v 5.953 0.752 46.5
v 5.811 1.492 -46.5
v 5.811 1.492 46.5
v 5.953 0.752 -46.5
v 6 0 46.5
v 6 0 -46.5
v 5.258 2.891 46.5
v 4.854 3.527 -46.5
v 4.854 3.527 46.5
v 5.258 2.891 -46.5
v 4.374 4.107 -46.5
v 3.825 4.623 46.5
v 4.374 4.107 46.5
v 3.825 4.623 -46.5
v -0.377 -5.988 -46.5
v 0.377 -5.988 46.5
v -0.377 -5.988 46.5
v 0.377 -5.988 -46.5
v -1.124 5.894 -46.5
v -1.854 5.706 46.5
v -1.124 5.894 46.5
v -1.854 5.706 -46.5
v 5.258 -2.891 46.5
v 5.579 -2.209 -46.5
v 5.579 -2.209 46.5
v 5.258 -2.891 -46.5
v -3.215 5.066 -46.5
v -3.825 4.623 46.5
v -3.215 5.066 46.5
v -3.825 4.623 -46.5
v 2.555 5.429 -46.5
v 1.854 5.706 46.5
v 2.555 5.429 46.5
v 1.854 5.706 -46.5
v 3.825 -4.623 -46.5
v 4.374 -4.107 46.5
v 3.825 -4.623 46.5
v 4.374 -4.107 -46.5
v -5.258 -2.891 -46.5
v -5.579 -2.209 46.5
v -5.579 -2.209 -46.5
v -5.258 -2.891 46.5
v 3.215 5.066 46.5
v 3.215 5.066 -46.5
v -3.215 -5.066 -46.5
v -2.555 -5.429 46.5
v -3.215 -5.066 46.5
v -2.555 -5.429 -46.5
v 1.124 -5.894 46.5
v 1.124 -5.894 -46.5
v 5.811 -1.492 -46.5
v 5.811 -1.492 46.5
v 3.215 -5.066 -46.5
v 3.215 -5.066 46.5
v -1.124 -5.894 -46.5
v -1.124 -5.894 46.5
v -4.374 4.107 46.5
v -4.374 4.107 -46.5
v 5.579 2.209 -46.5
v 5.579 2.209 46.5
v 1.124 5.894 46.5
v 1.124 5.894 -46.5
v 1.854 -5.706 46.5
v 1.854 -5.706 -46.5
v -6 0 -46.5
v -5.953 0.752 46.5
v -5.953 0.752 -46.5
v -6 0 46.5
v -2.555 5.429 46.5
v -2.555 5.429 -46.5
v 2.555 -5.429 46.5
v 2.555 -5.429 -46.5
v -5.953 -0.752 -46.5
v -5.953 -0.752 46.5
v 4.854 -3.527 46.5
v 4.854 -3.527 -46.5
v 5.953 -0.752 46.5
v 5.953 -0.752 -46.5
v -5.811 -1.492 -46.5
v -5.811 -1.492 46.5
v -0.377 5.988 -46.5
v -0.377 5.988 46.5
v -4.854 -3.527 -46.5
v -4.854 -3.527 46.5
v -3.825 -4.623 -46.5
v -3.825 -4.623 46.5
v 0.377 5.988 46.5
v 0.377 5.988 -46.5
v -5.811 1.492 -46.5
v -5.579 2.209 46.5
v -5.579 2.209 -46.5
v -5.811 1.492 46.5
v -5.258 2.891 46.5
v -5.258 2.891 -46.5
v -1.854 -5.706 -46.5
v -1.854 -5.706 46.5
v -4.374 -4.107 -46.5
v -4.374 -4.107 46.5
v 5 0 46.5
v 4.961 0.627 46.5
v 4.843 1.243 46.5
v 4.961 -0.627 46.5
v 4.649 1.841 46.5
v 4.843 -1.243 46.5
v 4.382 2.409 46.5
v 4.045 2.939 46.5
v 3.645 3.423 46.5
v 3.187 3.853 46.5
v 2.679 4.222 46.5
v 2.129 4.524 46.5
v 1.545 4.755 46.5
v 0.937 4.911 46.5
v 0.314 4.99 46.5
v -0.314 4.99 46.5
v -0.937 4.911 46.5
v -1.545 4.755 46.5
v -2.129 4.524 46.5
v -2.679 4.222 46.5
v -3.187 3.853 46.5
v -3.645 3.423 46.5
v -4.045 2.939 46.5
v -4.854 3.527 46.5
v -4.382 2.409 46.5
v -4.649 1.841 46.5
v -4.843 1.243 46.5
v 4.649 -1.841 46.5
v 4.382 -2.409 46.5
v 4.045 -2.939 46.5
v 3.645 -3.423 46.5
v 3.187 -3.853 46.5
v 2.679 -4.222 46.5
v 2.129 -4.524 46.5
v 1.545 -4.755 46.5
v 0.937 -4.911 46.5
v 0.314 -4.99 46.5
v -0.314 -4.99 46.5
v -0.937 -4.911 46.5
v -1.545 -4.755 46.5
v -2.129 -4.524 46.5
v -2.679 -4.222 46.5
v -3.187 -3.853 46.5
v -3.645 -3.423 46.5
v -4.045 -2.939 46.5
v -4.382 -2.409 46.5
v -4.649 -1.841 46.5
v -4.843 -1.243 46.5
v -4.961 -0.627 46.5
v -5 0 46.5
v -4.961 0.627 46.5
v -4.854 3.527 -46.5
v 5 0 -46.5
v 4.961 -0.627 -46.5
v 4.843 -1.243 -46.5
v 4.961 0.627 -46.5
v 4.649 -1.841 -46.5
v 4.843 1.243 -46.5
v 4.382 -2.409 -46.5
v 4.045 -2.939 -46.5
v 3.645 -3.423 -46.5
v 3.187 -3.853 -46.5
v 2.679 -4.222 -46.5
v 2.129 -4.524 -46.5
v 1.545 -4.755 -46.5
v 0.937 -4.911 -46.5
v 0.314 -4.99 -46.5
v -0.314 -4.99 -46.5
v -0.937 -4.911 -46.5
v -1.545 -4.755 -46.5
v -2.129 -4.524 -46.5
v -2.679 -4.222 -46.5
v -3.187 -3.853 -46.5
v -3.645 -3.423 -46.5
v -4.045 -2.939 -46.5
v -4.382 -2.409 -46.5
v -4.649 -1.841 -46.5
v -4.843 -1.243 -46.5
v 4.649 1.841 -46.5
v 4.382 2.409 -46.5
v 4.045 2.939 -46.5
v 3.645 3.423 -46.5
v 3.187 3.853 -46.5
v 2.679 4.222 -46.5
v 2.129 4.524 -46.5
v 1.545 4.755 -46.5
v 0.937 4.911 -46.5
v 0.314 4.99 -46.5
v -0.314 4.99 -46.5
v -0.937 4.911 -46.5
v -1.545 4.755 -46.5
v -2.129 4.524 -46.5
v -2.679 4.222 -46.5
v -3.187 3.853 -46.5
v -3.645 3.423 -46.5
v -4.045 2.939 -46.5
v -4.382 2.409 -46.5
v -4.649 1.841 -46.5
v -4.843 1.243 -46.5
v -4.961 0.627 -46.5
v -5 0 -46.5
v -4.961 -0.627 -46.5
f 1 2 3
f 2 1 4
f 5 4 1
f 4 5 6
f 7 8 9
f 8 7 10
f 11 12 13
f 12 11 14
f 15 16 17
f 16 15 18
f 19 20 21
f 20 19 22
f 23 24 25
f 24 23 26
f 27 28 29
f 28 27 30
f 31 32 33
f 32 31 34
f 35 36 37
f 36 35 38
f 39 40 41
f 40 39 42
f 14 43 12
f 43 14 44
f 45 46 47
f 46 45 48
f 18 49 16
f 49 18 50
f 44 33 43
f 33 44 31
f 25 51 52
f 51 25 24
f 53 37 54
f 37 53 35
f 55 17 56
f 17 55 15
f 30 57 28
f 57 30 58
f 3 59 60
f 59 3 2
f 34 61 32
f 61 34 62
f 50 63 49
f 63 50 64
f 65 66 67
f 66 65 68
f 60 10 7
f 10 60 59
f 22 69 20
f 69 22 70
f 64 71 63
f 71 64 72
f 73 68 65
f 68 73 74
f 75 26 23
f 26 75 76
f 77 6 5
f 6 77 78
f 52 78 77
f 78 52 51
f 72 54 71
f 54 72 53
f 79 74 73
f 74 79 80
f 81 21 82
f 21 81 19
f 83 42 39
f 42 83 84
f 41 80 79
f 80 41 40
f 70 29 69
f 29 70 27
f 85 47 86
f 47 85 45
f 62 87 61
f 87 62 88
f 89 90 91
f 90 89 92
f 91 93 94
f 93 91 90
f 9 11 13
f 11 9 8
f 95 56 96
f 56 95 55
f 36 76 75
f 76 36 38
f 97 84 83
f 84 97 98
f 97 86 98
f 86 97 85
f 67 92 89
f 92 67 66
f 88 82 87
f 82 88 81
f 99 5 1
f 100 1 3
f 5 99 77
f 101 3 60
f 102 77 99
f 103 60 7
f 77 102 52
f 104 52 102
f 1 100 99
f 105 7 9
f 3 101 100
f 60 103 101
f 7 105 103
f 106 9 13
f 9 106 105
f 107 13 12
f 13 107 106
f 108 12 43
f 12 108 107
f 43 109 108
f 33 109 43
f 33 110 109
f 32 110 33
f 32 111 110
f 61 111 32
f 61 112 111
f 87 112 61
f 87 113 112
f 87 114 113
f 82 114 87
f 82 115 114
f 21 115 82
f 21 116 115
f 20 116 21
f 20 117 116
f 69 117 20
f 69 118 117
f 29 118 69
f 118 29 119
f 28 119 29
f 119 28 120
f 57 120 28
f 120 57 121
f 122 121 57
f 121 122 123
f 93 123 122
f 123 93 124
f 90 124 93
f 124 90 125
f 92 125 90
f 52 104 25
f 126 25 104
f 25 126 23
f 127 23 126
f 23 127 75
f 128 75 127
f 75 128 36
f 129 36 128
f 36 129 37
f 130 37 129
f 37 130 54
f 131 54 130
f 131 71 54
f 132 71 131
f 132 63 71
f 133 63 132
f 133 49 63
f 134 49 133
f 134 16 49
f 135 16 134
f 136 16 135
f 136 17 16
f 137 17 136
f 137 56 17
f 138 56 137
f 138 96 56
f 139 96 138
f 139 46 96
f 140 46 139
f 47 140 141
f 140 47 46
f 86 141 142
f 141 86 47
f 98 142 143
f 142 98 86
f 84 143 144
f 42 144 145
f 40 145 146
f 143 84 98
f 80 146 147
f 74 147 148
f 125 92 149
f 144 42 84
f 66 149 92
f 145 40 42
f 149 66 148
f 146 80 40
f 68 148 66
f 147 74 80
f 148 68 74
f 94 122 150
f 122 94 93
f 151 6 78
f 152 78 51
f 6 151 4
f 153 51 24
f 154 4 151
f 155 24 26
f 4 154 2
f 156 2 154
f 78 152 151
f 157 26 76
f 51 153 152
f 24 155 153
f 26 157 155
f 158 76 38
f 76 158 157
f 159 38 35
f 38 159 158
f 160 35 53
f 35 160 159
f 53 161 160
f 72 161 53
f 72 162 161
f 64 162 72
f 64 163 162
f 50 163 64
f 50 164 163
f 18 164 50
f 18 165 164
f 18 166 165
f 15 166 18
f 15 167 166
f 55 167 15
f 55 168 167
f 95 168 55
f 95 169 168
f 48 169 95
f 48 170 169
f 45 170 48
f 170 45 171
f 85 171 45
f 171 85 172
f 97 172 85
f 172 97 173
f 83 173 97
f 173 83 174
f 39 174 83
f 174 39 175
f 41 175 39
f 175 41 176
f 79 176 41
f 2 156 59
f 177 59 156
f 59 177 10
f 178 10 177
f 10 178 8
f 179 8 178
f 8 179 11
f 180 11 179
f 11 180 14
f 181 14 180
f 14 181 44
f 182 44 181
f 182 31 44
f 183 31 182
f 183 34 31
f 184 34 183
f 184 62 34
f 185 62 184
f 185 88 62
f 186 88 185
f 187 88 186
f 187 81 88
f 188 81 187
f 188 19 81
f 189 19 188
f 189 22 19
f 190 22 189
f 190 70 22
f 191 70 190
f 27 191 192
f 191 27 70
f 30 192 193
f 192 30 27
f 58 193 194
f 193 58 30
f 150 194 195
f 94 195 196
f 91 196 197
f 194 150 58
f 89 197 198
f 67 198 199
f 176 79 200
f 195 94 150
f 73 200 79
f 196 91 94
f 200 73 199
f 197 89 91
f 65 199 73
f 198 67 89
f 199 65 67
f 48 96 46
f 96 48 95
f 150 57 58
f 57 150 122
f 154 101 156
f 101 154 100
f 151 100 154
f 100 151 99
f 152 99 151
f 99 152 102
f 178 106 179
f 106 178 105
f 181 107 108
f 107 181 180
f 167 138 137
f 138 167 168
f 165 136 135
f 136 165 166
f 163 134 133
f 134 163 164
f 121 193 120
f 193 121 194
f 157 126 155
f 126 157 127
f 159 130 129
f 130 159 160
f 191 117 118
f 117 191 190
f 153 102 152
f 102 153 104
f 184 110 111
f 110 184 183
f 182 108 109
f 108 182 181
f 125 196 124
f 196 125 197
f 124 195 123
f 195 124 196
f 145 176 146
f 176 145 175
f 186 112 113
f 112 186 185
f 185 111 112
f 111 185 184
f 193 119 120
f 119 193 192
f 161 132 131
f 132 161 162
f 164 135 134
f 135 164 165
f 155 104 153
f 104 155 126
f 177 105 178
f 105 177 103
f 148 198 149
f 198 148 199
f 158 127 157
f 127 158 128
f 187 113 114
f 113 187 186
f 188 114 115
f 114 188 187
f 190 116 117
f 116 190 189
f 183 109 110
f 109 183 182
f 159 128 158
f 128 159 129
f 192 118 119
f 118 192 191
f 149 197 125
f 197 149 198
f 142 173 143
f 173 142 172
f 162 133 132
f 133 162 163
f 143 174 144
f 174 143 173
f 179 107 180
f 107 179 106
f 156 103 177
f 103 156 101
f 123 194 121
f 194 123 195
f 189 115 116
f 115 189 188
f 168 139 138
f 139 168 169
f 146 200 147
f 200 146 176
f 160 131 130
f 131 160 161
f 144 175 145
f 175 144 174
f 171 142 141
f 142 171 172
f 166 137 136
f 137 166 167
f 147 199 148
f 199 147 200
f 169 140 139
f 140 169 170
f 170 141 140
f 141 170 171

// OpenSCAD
$fn = 50;


difference() {
	union() {
		translate(v = [0, 0, -46.5000000000]) {
			cylinder(h = 93, r = 6.0000000000);
		}
	}
	union() {
		translate(v = [0, 0, -100.0000000000]) {
			cylinder(h = 200, r = 5.0000000000);
		}
	}
}
